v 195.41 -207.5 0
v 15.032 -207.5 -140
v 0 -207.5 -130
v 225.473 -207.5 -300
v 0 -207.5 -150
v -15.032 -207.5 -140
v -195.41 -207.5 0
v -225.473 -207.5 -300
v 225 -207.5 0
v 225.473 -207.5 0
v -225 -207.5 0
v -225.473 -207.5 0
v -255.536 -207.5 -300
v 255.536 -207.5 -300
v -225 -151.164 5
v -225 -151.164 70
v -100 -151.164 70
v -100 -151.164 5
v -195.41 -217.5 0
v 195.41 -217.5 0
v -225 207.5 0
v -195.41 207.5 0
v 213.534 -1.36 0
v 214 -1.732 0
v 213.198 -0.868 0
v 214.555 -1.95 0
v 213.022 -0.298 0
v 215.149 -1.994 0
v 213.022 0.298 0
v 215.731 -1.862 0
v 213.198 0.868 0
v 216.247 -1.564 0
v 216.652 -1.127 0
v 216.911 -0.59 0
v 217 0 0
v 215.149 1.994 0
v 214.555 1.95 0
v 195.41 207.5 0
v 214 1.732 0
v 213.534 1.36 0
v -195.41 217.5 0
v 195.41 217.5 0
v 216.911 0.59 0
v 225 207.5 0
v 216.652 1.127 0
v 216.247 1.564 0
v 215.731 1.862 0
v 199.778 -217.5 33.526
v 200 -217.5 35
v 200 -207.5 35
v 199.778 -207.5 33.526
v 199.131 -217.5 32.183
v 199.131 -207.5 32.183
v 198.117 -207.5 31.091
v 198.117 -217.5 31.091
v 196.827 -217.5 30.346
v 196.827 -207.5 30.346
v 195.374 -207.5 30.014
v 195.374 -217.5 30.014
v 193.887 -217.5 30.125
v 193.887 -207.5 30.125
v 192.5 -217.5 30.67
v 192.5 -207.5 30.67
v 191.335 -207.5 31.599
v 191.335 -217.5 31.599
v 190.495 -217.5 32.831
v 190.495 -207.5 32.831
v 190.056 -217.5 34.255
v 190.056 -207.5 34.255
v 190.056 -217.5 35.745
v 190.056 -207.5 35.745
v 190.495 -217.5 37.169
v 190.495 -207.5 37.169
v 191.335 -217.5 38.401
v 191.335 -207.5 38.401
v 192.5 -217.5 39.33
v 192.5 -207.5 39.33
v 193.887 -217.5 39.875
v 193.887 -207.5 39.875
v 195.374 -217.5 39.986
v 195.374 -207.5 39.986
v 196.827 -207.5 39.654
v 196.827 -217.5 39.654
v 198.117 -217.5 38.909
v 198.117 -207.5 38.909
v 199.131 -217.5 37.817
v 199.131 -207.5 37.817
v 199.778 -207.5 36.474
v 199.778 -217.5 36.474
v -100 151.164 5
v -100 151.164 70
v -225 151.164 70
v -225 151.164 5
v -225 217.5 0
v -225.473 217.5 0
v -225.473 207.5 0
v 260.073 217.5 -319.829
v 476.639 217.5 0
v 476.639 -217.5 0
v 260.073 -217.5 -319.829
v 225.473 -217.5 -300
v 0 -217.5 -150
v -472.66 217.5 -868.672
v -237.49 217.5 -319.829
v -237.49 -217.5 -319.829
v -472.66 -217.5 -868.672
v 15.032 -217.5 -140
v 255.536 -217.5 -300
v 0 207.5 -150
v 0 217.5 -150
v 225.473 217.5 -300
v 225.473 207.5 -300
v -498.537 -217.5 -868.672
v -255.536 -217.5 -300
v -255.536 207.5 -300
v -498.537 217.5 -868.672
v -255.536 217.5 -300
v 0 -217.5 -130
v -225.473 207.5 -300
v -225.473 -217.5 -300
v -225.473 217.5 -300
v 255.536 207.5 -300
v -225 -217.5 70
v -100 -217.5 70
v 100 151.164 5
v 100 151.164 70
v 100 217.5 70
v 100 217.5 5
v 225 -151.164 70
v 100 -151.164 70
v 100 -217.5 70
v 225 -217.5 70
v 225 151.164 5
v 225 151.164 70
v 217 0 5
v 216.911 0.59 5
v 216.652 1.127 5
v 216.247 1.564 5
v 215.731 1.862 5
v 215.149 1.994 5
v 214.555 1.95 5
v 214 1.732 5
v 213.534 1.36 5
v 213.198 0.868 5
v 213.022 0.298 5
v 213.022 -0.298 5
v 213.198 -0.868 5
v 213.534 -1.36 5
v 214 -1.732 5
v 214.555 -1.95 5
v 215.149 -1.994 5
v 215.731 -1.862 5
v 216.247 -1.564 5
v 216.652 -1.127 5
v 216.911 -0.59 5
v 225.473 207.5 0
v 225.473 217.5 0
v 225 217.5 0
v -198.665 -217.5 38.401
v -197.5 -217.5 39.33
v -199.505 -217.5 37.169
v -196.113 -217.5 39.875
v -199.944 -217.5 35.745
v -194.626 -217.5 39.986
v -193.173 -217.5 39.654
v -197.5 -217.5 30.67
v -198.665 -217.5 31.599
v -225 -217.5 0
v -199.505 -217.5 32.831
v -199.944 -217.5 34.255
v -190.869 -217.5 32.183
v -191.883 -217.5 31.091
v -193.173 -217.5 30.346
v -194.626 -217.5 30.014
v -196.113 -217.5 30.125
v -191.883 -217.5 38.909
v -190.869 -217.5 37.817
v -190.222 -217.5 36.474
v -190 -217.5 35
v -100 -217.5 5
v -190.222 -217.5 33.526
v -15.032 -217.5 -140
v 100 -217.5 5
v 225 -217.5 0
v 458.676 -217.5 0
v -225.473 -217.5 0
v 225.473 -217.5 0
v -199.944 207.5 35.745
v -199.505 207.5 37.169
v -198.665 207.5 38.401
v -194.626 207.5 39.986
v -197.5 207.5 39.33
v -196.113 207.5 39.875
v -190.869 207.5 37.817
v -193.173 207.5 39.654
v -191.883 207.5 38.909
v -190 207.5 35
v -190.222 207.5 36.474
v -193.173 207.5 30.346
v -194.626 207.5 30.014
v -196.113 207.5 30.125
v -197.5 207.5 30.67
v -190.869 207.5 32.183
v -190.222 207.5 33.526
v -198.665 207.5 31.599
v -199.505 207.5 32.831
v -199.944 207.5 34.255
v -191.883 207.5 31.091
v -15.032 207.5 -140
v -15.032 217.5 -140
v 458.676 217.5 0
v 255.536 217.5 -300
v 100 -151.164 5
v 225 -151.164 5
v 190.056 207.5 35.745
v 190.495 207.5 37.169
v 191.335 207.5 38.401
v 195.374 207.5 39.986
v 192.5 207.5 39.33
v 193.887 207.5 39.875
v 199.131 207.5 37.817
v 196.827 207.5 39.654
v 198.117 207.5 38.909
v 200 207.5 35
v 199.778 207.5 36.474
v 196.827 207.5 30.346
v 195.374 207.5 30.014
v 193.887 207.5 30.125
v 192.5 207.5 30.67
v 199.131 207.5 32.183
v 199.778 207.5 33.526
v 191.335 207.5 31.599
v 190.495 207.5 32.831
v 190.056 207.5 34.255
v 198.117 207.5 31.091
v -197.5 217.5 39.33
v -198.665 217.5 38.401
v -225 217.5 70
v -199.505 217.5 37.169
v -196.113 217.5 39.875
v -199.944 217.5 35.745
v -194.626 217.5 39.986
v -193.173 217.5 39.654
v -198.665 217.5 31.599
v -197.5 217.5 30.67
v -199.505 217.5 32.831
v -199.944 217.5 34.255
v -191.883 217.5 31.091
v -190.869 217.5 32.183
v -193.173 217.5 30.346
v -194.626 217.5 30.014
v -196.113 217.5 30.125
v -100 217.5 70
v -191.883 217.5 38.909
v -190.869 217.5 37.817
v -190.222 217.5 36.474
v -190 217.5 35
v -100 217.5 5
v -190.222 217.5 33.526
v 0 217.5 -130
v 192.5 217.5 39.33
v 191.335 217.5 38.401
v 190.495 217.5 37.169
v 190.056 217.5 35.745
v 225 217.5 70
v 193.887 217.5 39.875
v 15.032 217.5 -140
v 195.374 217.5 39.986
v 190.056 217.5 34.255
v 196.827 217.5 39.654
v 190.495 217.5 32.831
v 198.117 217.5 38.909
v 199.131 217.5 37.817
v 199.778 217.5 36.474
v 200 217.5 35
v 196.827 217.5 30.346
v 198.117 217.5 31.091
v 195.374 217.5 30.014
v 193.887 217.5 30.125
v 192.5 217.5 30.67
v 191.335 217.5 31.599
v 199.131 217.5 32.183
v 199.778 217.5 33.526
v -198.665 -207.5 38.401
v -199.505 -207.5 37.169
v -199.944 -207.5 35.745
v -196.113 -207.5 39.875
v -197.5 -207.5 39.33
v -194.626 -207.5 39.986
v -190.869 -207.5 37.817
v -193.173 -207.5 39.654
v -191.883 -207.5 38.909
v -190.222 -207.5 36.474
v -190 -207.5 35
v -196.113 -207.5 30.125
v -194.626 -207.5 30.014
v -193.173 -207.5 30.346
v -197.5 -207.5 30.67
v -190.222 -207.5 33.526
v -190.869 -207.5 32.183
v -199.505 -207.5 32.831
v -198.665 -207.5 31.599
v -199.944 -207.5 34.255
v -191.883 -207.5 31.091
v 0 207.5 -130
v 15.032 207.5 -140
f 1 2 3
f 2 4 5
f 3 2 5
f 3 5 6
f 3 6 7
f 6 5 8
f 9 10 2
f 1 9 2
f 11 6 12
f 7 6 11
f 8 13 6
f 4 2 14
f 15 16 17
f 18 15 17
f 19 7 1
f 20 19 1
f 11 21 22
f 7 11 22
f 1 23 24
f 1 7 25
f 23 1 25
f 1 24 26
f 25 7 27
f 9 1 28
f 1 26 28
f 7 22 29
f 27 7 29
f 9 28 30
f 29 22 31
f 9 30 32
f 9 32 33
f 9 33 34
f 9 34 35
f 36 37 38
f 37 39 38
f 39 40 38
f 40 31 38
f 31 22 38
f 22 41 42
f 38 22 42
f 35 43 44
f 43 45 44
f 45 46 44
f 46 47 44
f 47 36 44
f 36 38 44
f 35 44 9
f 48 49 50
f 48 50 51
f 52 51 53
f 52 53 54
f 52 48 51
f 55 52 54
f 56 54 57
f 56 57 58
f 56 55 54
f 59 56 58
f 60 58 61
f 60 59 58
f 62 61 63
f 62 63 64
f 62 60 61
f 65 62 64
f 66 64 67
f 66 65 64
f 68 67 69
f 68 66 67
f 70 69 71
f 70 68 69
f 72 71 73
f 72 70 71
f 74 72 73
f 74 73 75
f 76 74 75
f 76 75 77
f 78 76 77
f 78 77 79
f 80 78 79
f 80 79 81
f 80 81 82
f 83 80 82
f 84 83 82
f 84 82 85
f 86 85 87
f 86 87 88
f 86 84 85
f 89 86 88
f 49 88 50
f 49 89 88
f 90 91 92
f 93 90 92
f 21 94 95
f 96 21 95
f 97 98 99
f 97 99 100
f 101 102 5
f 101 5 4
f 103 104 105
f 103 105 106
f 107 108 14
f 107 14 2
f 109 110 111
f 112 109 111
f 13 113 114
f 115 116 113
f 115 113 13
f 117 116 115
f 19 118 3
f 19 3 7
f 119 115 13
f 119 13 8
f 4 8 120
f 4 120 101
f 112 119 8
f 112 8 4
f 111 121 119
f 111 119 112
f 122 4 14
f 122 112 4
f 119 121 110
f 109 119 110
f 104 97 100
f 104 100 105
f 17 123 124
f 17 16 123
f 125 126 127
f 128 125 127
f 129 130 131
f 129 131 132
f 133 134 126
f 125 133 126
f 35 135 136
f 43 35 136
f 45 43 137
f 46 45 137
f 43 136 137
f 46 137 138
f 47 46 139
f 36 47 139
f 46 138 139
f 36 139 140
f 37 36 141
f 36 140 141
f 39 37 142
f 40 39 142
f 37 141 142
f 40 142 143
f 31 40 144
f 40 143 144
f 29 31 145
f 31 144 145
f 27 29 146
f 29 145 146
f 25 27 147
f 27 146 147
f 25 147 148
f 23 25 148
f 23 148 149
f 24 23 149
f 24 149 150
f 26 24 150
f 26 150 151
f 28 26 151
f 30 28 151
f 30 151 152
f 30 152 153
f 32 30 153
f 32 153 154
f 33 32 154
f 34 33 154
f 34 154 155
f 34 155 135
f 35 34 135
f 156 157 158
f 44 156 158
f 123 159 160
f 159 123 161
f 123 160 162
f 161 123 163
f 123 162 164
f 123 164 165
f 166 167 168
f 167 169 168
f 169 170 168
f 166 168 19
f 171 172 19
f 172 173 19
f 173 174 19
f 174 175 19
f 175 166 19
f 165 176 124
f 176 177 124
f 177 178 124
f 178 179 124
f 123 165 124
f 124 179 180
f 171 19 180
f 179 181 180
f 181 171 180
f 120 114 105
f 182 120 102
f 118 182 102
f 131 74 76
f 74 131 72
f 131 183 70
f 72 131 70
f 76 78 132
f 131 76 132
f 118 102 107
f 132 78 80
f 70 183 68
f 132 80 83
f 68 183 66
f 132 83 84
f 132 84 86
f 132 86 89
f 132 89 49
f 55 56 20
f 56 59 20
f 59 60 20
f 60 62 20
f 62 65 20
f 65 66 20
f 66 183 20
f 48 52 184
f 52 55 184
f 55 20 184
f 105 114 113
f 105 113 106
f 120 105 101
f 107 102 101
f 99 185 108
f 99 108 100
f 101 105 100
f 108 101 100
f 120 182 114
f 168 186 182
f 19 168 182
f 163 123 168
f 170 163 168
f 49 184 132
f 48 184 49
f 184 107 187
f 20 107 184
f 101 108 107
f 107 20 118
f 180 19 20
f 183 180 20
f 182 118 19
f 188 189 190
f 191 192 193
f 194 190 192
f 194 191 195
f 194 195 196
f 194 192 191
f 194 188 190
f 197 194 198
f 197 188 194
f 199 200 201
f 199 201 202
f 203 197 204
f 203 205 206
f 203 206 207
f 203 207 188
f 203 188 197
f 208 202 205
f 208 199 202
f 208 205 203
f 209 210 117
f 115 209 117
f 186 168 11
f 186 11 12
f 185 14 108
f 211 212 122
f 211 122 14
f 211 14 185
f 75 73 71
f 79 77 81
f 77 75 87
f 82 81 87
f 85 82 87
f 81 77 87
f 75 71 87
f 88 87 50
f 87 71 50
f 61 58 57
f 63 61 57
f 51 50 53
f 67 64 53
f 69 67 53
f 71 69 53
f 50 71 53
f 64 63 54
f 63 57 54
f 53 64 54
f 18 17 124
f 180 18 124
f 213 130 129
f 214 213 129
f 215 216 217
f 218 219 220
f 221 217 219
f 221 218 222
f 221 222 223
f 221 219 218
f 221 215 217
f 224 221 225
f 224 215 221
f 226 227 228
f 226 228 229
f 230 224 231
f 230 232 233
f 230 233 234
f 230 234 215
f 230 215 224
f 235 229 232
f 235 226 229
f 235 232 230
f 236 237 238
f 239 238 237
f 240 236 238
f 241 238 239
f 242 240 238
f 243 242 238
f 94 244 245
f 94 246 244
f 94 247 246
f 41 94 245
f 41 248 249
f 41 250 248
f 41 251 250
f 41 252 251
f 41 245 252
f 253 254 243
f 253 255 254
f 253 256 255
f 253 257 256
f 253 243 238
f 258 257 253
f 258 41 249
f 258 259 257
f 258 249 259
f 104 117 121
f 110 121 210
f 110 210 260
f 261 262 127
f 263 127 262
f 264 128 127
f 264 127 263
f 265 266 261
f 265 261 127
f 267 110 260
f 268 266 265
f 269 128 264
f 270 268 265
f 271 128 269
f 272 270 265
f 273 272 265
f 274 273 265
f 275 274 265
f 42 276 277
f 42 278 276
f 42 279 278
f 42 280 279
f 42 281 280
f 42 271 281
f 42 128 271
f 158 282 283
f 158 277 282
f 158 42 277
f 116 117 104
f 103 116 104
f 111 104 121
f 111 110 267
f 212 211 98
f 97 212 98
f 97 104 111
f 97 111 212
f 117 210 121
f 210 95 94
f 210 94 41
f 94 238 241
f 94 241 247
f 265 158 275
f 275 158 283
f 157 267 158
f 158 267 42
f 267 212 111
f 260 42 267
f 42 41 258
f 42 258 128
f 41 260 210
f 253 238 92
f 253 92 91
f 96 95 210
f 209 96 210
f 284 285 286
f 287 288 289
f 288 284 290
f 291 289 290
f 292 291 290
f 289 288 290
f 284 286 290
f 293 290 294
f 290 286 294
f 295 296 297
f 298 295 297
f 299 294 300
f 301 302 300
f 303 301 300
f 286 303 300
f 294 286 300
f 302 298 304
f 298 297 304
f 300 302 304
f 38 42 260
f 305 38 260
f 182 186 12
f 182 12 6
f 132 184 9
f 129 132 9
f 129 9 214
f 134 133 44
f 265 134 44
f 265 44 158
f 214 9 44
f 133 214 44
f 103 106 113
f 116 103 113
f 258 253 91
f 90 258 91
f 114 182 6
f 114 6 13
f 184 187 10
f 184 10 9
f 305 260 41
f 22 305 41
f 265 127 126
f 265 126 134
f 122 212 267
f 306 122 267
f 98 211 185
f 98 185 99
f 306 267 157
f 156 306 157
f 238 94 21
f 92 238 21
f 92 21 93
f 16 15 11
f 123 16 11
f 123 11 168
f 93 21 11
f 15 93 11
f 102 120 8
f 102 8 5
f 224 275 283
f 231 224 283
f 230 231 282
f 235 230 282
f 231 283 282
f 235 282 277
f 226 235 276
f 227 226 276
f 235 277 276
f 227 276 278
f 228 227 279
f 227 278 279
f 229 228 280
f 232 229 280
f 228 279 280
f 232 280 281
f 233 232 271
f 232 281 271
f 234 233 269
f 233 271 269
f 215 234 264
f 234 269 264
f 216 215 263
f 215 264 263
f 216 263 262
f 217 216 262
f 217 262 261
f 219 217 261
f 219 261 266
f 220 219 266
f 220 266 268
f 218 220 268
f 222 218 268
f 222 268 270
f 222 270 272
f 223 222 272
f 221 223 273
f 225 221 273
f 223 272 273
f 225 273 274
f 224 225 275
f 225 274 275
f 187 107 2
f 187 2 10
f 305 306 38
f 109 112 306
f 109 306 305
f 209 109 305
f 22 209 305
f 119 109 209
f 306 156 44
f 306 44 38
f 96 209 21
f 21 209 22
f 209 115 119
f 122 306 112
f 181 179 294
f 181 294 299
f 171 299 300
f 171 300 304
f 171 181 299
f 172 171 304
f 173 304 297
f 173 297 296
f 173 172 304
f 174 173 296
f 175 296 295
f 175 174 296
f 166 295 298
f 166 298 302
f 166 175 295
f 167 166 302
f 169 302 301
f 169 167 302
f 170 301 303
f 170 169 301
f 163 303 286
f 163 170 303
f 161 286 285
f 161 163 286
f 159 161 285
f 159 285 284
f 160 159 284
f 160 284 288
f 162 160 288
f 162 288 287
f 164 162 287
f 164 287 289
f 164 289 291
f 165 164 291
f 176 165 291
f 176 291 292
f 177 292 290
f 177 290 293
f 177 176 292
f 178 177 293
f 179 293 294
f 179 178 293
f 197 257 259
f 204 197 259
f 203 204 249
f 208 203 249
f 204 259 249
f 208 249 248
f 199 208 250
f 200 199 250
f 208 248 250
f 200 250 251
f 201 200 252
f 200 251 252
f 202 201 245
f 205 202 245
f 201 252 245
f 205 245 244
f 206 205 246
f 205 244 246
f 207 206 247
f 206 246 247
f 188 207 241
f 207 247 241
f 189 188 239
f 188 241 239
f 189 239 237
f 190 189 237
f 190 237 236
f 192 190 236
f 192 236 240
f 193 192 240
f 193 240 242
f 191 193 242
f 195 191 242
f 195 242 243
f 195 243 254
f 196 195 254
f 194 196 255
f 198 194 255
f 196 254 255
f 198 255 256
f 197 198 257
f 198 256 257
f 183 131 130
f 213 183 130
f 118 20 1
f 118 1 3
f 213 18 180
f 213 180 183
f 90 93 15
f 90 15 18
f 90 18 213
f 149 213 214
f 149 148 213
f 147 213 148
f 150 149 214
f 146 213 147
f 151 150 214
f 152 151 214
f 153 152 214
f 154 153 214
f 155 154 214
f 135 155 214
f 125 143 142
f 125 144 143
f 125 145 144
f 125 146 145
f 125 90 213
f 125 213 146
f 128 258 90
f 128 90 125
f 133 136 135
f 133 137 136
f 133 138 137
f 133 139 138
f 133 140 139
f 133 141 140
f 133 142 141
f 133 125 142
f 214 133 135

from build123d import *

# Parameters (mm, degrees)
EXTRUDE_1_DEPTH          = 70
CUT_EXTRUDE_1_DEPTH      = 1
CUT_EXTRUDE_1_DEPTH_BACK = 65
SKETCH_4_R               = 2
CUT_EXTRUDE_2_DEPTH      = 10
SKETCH_3_R               = 5
CUT_EXTRUDE_3_DEPTH      = 10
EXTRUDE_2_DEPTH          = 10
EXTRUDE_3_DEPTH          = 435


with BuildPart() as part:
    # 草图1 → 凸台-拉伸1 (new body)
    with BuildSketch(Plane.XY):
        Polygon((225, 0), (225, 217.5), (-225, 217.5), (-225, 0), (-225, -217.5), (225, -217.5), align=None)
    extrude(amount=EXTRUDE_1_DEPTH)

    # 草图2 → 切除-拉伸1 (cut, two sides)
    with BuildSketch(Plane.XY.offset(70)) as cut_extrude_1_sk:
        Polygon((0, 217.5), (-100, 217.5), (-100, 151.164004593), (-225, 151.164004593), (-225, -151.164004593), (-100, -151.164004593), (-100, -217.5), (100, -217.5), (100, -151.164004593), (225, -151.164004593), (225, 151.164004593), (100, 151.164004593), (100, 217.5), align=None)
    extrude(amount=CUT_EXTRUDE_1_DEPTH, mode=Mode.SUBTRACT)
    extrude(cut_extrude_1_sk.sketch, amount=-CUT_EXTRUDE_1_DEPTH_BACK, mode=Mode.SUBTRACT)

    # 草图4 → 切除-拉伸2 (cut)
    with BuildSketch(Plane.XY.offset(5)):
        with Locations((215, 0)):
            Circle(SKETCH_4_R)
    extrude(amount=-CUT_EXTRUDE_2_DEPTH, mode=Mode.SUBTRACT)

    # 草图3 → 切除-拉伸3 (cut)
    with BuildSketch(Plane(origin=(0, 217.5, 0), x_dir=(1, 0, 0), z_dir=(0, 1, 0))):
        with Locations((-195, -35)):
            Circle(SKETCH_3_R)
        with Locations((195, -35)):
            Circle(SKETCH_3_R)
    cut_extrude_3 = extrude(amount=-CUT_EXTRUDE_3_DEPTH, mode=Mode.SUBTRACT)

    # 镜向1: 切除-拉伸3 across plane
    add(cut_extrude_3.mirror(Plane.ZX), mode=Mode.SUBTRACT)

    # 草图6 → 凸台-拉伸2 (add)
    with BuildSketch(Plane(origin=(0, -217.5, 0), x_dir=(-1, 0, 0), z_dir=(0, -1, 0))):
        Polygon((-15.031554005, 140), (-225.473310071, 0), (-225, 0), (-195.410202062, 0), (0, 130), (195.410202062, 0), (225, 0), (225.473310071, 0), (15.031554005, 140), (255.536418081, 300), (225.473310071, 300), (0, 150), (-225.473310071, 300), (-255.536418081, 300), align=None)
    extrude_2 = extrude(amount=-EXTRUDE_2_DEPTH)

    # 镜向2: 凸台-拉伸2 across plane
    add(extrude_2.mirror(Plane.ZX))

    # 草图7 → 凸台-拉伸3 (add)
    with BuildSketch(Plane(origin=(0, 217.5, 0), x_dir=(1, 0, 0), z_dir=(0, 1, 0))):
        Polygon((-255.536418081, 300), (255.536418081, 300), (458.675595133, 0), (476.639391287, 0), (260.073177672, 319.829316172), (-237.490096329, 319.829316172), (-472.660078337, 868.671562843), (-498.536821512, 868.671562843), align=None)
    extrude(amount=-EXTRUDE_3_DEPTH)


solid = part.part
